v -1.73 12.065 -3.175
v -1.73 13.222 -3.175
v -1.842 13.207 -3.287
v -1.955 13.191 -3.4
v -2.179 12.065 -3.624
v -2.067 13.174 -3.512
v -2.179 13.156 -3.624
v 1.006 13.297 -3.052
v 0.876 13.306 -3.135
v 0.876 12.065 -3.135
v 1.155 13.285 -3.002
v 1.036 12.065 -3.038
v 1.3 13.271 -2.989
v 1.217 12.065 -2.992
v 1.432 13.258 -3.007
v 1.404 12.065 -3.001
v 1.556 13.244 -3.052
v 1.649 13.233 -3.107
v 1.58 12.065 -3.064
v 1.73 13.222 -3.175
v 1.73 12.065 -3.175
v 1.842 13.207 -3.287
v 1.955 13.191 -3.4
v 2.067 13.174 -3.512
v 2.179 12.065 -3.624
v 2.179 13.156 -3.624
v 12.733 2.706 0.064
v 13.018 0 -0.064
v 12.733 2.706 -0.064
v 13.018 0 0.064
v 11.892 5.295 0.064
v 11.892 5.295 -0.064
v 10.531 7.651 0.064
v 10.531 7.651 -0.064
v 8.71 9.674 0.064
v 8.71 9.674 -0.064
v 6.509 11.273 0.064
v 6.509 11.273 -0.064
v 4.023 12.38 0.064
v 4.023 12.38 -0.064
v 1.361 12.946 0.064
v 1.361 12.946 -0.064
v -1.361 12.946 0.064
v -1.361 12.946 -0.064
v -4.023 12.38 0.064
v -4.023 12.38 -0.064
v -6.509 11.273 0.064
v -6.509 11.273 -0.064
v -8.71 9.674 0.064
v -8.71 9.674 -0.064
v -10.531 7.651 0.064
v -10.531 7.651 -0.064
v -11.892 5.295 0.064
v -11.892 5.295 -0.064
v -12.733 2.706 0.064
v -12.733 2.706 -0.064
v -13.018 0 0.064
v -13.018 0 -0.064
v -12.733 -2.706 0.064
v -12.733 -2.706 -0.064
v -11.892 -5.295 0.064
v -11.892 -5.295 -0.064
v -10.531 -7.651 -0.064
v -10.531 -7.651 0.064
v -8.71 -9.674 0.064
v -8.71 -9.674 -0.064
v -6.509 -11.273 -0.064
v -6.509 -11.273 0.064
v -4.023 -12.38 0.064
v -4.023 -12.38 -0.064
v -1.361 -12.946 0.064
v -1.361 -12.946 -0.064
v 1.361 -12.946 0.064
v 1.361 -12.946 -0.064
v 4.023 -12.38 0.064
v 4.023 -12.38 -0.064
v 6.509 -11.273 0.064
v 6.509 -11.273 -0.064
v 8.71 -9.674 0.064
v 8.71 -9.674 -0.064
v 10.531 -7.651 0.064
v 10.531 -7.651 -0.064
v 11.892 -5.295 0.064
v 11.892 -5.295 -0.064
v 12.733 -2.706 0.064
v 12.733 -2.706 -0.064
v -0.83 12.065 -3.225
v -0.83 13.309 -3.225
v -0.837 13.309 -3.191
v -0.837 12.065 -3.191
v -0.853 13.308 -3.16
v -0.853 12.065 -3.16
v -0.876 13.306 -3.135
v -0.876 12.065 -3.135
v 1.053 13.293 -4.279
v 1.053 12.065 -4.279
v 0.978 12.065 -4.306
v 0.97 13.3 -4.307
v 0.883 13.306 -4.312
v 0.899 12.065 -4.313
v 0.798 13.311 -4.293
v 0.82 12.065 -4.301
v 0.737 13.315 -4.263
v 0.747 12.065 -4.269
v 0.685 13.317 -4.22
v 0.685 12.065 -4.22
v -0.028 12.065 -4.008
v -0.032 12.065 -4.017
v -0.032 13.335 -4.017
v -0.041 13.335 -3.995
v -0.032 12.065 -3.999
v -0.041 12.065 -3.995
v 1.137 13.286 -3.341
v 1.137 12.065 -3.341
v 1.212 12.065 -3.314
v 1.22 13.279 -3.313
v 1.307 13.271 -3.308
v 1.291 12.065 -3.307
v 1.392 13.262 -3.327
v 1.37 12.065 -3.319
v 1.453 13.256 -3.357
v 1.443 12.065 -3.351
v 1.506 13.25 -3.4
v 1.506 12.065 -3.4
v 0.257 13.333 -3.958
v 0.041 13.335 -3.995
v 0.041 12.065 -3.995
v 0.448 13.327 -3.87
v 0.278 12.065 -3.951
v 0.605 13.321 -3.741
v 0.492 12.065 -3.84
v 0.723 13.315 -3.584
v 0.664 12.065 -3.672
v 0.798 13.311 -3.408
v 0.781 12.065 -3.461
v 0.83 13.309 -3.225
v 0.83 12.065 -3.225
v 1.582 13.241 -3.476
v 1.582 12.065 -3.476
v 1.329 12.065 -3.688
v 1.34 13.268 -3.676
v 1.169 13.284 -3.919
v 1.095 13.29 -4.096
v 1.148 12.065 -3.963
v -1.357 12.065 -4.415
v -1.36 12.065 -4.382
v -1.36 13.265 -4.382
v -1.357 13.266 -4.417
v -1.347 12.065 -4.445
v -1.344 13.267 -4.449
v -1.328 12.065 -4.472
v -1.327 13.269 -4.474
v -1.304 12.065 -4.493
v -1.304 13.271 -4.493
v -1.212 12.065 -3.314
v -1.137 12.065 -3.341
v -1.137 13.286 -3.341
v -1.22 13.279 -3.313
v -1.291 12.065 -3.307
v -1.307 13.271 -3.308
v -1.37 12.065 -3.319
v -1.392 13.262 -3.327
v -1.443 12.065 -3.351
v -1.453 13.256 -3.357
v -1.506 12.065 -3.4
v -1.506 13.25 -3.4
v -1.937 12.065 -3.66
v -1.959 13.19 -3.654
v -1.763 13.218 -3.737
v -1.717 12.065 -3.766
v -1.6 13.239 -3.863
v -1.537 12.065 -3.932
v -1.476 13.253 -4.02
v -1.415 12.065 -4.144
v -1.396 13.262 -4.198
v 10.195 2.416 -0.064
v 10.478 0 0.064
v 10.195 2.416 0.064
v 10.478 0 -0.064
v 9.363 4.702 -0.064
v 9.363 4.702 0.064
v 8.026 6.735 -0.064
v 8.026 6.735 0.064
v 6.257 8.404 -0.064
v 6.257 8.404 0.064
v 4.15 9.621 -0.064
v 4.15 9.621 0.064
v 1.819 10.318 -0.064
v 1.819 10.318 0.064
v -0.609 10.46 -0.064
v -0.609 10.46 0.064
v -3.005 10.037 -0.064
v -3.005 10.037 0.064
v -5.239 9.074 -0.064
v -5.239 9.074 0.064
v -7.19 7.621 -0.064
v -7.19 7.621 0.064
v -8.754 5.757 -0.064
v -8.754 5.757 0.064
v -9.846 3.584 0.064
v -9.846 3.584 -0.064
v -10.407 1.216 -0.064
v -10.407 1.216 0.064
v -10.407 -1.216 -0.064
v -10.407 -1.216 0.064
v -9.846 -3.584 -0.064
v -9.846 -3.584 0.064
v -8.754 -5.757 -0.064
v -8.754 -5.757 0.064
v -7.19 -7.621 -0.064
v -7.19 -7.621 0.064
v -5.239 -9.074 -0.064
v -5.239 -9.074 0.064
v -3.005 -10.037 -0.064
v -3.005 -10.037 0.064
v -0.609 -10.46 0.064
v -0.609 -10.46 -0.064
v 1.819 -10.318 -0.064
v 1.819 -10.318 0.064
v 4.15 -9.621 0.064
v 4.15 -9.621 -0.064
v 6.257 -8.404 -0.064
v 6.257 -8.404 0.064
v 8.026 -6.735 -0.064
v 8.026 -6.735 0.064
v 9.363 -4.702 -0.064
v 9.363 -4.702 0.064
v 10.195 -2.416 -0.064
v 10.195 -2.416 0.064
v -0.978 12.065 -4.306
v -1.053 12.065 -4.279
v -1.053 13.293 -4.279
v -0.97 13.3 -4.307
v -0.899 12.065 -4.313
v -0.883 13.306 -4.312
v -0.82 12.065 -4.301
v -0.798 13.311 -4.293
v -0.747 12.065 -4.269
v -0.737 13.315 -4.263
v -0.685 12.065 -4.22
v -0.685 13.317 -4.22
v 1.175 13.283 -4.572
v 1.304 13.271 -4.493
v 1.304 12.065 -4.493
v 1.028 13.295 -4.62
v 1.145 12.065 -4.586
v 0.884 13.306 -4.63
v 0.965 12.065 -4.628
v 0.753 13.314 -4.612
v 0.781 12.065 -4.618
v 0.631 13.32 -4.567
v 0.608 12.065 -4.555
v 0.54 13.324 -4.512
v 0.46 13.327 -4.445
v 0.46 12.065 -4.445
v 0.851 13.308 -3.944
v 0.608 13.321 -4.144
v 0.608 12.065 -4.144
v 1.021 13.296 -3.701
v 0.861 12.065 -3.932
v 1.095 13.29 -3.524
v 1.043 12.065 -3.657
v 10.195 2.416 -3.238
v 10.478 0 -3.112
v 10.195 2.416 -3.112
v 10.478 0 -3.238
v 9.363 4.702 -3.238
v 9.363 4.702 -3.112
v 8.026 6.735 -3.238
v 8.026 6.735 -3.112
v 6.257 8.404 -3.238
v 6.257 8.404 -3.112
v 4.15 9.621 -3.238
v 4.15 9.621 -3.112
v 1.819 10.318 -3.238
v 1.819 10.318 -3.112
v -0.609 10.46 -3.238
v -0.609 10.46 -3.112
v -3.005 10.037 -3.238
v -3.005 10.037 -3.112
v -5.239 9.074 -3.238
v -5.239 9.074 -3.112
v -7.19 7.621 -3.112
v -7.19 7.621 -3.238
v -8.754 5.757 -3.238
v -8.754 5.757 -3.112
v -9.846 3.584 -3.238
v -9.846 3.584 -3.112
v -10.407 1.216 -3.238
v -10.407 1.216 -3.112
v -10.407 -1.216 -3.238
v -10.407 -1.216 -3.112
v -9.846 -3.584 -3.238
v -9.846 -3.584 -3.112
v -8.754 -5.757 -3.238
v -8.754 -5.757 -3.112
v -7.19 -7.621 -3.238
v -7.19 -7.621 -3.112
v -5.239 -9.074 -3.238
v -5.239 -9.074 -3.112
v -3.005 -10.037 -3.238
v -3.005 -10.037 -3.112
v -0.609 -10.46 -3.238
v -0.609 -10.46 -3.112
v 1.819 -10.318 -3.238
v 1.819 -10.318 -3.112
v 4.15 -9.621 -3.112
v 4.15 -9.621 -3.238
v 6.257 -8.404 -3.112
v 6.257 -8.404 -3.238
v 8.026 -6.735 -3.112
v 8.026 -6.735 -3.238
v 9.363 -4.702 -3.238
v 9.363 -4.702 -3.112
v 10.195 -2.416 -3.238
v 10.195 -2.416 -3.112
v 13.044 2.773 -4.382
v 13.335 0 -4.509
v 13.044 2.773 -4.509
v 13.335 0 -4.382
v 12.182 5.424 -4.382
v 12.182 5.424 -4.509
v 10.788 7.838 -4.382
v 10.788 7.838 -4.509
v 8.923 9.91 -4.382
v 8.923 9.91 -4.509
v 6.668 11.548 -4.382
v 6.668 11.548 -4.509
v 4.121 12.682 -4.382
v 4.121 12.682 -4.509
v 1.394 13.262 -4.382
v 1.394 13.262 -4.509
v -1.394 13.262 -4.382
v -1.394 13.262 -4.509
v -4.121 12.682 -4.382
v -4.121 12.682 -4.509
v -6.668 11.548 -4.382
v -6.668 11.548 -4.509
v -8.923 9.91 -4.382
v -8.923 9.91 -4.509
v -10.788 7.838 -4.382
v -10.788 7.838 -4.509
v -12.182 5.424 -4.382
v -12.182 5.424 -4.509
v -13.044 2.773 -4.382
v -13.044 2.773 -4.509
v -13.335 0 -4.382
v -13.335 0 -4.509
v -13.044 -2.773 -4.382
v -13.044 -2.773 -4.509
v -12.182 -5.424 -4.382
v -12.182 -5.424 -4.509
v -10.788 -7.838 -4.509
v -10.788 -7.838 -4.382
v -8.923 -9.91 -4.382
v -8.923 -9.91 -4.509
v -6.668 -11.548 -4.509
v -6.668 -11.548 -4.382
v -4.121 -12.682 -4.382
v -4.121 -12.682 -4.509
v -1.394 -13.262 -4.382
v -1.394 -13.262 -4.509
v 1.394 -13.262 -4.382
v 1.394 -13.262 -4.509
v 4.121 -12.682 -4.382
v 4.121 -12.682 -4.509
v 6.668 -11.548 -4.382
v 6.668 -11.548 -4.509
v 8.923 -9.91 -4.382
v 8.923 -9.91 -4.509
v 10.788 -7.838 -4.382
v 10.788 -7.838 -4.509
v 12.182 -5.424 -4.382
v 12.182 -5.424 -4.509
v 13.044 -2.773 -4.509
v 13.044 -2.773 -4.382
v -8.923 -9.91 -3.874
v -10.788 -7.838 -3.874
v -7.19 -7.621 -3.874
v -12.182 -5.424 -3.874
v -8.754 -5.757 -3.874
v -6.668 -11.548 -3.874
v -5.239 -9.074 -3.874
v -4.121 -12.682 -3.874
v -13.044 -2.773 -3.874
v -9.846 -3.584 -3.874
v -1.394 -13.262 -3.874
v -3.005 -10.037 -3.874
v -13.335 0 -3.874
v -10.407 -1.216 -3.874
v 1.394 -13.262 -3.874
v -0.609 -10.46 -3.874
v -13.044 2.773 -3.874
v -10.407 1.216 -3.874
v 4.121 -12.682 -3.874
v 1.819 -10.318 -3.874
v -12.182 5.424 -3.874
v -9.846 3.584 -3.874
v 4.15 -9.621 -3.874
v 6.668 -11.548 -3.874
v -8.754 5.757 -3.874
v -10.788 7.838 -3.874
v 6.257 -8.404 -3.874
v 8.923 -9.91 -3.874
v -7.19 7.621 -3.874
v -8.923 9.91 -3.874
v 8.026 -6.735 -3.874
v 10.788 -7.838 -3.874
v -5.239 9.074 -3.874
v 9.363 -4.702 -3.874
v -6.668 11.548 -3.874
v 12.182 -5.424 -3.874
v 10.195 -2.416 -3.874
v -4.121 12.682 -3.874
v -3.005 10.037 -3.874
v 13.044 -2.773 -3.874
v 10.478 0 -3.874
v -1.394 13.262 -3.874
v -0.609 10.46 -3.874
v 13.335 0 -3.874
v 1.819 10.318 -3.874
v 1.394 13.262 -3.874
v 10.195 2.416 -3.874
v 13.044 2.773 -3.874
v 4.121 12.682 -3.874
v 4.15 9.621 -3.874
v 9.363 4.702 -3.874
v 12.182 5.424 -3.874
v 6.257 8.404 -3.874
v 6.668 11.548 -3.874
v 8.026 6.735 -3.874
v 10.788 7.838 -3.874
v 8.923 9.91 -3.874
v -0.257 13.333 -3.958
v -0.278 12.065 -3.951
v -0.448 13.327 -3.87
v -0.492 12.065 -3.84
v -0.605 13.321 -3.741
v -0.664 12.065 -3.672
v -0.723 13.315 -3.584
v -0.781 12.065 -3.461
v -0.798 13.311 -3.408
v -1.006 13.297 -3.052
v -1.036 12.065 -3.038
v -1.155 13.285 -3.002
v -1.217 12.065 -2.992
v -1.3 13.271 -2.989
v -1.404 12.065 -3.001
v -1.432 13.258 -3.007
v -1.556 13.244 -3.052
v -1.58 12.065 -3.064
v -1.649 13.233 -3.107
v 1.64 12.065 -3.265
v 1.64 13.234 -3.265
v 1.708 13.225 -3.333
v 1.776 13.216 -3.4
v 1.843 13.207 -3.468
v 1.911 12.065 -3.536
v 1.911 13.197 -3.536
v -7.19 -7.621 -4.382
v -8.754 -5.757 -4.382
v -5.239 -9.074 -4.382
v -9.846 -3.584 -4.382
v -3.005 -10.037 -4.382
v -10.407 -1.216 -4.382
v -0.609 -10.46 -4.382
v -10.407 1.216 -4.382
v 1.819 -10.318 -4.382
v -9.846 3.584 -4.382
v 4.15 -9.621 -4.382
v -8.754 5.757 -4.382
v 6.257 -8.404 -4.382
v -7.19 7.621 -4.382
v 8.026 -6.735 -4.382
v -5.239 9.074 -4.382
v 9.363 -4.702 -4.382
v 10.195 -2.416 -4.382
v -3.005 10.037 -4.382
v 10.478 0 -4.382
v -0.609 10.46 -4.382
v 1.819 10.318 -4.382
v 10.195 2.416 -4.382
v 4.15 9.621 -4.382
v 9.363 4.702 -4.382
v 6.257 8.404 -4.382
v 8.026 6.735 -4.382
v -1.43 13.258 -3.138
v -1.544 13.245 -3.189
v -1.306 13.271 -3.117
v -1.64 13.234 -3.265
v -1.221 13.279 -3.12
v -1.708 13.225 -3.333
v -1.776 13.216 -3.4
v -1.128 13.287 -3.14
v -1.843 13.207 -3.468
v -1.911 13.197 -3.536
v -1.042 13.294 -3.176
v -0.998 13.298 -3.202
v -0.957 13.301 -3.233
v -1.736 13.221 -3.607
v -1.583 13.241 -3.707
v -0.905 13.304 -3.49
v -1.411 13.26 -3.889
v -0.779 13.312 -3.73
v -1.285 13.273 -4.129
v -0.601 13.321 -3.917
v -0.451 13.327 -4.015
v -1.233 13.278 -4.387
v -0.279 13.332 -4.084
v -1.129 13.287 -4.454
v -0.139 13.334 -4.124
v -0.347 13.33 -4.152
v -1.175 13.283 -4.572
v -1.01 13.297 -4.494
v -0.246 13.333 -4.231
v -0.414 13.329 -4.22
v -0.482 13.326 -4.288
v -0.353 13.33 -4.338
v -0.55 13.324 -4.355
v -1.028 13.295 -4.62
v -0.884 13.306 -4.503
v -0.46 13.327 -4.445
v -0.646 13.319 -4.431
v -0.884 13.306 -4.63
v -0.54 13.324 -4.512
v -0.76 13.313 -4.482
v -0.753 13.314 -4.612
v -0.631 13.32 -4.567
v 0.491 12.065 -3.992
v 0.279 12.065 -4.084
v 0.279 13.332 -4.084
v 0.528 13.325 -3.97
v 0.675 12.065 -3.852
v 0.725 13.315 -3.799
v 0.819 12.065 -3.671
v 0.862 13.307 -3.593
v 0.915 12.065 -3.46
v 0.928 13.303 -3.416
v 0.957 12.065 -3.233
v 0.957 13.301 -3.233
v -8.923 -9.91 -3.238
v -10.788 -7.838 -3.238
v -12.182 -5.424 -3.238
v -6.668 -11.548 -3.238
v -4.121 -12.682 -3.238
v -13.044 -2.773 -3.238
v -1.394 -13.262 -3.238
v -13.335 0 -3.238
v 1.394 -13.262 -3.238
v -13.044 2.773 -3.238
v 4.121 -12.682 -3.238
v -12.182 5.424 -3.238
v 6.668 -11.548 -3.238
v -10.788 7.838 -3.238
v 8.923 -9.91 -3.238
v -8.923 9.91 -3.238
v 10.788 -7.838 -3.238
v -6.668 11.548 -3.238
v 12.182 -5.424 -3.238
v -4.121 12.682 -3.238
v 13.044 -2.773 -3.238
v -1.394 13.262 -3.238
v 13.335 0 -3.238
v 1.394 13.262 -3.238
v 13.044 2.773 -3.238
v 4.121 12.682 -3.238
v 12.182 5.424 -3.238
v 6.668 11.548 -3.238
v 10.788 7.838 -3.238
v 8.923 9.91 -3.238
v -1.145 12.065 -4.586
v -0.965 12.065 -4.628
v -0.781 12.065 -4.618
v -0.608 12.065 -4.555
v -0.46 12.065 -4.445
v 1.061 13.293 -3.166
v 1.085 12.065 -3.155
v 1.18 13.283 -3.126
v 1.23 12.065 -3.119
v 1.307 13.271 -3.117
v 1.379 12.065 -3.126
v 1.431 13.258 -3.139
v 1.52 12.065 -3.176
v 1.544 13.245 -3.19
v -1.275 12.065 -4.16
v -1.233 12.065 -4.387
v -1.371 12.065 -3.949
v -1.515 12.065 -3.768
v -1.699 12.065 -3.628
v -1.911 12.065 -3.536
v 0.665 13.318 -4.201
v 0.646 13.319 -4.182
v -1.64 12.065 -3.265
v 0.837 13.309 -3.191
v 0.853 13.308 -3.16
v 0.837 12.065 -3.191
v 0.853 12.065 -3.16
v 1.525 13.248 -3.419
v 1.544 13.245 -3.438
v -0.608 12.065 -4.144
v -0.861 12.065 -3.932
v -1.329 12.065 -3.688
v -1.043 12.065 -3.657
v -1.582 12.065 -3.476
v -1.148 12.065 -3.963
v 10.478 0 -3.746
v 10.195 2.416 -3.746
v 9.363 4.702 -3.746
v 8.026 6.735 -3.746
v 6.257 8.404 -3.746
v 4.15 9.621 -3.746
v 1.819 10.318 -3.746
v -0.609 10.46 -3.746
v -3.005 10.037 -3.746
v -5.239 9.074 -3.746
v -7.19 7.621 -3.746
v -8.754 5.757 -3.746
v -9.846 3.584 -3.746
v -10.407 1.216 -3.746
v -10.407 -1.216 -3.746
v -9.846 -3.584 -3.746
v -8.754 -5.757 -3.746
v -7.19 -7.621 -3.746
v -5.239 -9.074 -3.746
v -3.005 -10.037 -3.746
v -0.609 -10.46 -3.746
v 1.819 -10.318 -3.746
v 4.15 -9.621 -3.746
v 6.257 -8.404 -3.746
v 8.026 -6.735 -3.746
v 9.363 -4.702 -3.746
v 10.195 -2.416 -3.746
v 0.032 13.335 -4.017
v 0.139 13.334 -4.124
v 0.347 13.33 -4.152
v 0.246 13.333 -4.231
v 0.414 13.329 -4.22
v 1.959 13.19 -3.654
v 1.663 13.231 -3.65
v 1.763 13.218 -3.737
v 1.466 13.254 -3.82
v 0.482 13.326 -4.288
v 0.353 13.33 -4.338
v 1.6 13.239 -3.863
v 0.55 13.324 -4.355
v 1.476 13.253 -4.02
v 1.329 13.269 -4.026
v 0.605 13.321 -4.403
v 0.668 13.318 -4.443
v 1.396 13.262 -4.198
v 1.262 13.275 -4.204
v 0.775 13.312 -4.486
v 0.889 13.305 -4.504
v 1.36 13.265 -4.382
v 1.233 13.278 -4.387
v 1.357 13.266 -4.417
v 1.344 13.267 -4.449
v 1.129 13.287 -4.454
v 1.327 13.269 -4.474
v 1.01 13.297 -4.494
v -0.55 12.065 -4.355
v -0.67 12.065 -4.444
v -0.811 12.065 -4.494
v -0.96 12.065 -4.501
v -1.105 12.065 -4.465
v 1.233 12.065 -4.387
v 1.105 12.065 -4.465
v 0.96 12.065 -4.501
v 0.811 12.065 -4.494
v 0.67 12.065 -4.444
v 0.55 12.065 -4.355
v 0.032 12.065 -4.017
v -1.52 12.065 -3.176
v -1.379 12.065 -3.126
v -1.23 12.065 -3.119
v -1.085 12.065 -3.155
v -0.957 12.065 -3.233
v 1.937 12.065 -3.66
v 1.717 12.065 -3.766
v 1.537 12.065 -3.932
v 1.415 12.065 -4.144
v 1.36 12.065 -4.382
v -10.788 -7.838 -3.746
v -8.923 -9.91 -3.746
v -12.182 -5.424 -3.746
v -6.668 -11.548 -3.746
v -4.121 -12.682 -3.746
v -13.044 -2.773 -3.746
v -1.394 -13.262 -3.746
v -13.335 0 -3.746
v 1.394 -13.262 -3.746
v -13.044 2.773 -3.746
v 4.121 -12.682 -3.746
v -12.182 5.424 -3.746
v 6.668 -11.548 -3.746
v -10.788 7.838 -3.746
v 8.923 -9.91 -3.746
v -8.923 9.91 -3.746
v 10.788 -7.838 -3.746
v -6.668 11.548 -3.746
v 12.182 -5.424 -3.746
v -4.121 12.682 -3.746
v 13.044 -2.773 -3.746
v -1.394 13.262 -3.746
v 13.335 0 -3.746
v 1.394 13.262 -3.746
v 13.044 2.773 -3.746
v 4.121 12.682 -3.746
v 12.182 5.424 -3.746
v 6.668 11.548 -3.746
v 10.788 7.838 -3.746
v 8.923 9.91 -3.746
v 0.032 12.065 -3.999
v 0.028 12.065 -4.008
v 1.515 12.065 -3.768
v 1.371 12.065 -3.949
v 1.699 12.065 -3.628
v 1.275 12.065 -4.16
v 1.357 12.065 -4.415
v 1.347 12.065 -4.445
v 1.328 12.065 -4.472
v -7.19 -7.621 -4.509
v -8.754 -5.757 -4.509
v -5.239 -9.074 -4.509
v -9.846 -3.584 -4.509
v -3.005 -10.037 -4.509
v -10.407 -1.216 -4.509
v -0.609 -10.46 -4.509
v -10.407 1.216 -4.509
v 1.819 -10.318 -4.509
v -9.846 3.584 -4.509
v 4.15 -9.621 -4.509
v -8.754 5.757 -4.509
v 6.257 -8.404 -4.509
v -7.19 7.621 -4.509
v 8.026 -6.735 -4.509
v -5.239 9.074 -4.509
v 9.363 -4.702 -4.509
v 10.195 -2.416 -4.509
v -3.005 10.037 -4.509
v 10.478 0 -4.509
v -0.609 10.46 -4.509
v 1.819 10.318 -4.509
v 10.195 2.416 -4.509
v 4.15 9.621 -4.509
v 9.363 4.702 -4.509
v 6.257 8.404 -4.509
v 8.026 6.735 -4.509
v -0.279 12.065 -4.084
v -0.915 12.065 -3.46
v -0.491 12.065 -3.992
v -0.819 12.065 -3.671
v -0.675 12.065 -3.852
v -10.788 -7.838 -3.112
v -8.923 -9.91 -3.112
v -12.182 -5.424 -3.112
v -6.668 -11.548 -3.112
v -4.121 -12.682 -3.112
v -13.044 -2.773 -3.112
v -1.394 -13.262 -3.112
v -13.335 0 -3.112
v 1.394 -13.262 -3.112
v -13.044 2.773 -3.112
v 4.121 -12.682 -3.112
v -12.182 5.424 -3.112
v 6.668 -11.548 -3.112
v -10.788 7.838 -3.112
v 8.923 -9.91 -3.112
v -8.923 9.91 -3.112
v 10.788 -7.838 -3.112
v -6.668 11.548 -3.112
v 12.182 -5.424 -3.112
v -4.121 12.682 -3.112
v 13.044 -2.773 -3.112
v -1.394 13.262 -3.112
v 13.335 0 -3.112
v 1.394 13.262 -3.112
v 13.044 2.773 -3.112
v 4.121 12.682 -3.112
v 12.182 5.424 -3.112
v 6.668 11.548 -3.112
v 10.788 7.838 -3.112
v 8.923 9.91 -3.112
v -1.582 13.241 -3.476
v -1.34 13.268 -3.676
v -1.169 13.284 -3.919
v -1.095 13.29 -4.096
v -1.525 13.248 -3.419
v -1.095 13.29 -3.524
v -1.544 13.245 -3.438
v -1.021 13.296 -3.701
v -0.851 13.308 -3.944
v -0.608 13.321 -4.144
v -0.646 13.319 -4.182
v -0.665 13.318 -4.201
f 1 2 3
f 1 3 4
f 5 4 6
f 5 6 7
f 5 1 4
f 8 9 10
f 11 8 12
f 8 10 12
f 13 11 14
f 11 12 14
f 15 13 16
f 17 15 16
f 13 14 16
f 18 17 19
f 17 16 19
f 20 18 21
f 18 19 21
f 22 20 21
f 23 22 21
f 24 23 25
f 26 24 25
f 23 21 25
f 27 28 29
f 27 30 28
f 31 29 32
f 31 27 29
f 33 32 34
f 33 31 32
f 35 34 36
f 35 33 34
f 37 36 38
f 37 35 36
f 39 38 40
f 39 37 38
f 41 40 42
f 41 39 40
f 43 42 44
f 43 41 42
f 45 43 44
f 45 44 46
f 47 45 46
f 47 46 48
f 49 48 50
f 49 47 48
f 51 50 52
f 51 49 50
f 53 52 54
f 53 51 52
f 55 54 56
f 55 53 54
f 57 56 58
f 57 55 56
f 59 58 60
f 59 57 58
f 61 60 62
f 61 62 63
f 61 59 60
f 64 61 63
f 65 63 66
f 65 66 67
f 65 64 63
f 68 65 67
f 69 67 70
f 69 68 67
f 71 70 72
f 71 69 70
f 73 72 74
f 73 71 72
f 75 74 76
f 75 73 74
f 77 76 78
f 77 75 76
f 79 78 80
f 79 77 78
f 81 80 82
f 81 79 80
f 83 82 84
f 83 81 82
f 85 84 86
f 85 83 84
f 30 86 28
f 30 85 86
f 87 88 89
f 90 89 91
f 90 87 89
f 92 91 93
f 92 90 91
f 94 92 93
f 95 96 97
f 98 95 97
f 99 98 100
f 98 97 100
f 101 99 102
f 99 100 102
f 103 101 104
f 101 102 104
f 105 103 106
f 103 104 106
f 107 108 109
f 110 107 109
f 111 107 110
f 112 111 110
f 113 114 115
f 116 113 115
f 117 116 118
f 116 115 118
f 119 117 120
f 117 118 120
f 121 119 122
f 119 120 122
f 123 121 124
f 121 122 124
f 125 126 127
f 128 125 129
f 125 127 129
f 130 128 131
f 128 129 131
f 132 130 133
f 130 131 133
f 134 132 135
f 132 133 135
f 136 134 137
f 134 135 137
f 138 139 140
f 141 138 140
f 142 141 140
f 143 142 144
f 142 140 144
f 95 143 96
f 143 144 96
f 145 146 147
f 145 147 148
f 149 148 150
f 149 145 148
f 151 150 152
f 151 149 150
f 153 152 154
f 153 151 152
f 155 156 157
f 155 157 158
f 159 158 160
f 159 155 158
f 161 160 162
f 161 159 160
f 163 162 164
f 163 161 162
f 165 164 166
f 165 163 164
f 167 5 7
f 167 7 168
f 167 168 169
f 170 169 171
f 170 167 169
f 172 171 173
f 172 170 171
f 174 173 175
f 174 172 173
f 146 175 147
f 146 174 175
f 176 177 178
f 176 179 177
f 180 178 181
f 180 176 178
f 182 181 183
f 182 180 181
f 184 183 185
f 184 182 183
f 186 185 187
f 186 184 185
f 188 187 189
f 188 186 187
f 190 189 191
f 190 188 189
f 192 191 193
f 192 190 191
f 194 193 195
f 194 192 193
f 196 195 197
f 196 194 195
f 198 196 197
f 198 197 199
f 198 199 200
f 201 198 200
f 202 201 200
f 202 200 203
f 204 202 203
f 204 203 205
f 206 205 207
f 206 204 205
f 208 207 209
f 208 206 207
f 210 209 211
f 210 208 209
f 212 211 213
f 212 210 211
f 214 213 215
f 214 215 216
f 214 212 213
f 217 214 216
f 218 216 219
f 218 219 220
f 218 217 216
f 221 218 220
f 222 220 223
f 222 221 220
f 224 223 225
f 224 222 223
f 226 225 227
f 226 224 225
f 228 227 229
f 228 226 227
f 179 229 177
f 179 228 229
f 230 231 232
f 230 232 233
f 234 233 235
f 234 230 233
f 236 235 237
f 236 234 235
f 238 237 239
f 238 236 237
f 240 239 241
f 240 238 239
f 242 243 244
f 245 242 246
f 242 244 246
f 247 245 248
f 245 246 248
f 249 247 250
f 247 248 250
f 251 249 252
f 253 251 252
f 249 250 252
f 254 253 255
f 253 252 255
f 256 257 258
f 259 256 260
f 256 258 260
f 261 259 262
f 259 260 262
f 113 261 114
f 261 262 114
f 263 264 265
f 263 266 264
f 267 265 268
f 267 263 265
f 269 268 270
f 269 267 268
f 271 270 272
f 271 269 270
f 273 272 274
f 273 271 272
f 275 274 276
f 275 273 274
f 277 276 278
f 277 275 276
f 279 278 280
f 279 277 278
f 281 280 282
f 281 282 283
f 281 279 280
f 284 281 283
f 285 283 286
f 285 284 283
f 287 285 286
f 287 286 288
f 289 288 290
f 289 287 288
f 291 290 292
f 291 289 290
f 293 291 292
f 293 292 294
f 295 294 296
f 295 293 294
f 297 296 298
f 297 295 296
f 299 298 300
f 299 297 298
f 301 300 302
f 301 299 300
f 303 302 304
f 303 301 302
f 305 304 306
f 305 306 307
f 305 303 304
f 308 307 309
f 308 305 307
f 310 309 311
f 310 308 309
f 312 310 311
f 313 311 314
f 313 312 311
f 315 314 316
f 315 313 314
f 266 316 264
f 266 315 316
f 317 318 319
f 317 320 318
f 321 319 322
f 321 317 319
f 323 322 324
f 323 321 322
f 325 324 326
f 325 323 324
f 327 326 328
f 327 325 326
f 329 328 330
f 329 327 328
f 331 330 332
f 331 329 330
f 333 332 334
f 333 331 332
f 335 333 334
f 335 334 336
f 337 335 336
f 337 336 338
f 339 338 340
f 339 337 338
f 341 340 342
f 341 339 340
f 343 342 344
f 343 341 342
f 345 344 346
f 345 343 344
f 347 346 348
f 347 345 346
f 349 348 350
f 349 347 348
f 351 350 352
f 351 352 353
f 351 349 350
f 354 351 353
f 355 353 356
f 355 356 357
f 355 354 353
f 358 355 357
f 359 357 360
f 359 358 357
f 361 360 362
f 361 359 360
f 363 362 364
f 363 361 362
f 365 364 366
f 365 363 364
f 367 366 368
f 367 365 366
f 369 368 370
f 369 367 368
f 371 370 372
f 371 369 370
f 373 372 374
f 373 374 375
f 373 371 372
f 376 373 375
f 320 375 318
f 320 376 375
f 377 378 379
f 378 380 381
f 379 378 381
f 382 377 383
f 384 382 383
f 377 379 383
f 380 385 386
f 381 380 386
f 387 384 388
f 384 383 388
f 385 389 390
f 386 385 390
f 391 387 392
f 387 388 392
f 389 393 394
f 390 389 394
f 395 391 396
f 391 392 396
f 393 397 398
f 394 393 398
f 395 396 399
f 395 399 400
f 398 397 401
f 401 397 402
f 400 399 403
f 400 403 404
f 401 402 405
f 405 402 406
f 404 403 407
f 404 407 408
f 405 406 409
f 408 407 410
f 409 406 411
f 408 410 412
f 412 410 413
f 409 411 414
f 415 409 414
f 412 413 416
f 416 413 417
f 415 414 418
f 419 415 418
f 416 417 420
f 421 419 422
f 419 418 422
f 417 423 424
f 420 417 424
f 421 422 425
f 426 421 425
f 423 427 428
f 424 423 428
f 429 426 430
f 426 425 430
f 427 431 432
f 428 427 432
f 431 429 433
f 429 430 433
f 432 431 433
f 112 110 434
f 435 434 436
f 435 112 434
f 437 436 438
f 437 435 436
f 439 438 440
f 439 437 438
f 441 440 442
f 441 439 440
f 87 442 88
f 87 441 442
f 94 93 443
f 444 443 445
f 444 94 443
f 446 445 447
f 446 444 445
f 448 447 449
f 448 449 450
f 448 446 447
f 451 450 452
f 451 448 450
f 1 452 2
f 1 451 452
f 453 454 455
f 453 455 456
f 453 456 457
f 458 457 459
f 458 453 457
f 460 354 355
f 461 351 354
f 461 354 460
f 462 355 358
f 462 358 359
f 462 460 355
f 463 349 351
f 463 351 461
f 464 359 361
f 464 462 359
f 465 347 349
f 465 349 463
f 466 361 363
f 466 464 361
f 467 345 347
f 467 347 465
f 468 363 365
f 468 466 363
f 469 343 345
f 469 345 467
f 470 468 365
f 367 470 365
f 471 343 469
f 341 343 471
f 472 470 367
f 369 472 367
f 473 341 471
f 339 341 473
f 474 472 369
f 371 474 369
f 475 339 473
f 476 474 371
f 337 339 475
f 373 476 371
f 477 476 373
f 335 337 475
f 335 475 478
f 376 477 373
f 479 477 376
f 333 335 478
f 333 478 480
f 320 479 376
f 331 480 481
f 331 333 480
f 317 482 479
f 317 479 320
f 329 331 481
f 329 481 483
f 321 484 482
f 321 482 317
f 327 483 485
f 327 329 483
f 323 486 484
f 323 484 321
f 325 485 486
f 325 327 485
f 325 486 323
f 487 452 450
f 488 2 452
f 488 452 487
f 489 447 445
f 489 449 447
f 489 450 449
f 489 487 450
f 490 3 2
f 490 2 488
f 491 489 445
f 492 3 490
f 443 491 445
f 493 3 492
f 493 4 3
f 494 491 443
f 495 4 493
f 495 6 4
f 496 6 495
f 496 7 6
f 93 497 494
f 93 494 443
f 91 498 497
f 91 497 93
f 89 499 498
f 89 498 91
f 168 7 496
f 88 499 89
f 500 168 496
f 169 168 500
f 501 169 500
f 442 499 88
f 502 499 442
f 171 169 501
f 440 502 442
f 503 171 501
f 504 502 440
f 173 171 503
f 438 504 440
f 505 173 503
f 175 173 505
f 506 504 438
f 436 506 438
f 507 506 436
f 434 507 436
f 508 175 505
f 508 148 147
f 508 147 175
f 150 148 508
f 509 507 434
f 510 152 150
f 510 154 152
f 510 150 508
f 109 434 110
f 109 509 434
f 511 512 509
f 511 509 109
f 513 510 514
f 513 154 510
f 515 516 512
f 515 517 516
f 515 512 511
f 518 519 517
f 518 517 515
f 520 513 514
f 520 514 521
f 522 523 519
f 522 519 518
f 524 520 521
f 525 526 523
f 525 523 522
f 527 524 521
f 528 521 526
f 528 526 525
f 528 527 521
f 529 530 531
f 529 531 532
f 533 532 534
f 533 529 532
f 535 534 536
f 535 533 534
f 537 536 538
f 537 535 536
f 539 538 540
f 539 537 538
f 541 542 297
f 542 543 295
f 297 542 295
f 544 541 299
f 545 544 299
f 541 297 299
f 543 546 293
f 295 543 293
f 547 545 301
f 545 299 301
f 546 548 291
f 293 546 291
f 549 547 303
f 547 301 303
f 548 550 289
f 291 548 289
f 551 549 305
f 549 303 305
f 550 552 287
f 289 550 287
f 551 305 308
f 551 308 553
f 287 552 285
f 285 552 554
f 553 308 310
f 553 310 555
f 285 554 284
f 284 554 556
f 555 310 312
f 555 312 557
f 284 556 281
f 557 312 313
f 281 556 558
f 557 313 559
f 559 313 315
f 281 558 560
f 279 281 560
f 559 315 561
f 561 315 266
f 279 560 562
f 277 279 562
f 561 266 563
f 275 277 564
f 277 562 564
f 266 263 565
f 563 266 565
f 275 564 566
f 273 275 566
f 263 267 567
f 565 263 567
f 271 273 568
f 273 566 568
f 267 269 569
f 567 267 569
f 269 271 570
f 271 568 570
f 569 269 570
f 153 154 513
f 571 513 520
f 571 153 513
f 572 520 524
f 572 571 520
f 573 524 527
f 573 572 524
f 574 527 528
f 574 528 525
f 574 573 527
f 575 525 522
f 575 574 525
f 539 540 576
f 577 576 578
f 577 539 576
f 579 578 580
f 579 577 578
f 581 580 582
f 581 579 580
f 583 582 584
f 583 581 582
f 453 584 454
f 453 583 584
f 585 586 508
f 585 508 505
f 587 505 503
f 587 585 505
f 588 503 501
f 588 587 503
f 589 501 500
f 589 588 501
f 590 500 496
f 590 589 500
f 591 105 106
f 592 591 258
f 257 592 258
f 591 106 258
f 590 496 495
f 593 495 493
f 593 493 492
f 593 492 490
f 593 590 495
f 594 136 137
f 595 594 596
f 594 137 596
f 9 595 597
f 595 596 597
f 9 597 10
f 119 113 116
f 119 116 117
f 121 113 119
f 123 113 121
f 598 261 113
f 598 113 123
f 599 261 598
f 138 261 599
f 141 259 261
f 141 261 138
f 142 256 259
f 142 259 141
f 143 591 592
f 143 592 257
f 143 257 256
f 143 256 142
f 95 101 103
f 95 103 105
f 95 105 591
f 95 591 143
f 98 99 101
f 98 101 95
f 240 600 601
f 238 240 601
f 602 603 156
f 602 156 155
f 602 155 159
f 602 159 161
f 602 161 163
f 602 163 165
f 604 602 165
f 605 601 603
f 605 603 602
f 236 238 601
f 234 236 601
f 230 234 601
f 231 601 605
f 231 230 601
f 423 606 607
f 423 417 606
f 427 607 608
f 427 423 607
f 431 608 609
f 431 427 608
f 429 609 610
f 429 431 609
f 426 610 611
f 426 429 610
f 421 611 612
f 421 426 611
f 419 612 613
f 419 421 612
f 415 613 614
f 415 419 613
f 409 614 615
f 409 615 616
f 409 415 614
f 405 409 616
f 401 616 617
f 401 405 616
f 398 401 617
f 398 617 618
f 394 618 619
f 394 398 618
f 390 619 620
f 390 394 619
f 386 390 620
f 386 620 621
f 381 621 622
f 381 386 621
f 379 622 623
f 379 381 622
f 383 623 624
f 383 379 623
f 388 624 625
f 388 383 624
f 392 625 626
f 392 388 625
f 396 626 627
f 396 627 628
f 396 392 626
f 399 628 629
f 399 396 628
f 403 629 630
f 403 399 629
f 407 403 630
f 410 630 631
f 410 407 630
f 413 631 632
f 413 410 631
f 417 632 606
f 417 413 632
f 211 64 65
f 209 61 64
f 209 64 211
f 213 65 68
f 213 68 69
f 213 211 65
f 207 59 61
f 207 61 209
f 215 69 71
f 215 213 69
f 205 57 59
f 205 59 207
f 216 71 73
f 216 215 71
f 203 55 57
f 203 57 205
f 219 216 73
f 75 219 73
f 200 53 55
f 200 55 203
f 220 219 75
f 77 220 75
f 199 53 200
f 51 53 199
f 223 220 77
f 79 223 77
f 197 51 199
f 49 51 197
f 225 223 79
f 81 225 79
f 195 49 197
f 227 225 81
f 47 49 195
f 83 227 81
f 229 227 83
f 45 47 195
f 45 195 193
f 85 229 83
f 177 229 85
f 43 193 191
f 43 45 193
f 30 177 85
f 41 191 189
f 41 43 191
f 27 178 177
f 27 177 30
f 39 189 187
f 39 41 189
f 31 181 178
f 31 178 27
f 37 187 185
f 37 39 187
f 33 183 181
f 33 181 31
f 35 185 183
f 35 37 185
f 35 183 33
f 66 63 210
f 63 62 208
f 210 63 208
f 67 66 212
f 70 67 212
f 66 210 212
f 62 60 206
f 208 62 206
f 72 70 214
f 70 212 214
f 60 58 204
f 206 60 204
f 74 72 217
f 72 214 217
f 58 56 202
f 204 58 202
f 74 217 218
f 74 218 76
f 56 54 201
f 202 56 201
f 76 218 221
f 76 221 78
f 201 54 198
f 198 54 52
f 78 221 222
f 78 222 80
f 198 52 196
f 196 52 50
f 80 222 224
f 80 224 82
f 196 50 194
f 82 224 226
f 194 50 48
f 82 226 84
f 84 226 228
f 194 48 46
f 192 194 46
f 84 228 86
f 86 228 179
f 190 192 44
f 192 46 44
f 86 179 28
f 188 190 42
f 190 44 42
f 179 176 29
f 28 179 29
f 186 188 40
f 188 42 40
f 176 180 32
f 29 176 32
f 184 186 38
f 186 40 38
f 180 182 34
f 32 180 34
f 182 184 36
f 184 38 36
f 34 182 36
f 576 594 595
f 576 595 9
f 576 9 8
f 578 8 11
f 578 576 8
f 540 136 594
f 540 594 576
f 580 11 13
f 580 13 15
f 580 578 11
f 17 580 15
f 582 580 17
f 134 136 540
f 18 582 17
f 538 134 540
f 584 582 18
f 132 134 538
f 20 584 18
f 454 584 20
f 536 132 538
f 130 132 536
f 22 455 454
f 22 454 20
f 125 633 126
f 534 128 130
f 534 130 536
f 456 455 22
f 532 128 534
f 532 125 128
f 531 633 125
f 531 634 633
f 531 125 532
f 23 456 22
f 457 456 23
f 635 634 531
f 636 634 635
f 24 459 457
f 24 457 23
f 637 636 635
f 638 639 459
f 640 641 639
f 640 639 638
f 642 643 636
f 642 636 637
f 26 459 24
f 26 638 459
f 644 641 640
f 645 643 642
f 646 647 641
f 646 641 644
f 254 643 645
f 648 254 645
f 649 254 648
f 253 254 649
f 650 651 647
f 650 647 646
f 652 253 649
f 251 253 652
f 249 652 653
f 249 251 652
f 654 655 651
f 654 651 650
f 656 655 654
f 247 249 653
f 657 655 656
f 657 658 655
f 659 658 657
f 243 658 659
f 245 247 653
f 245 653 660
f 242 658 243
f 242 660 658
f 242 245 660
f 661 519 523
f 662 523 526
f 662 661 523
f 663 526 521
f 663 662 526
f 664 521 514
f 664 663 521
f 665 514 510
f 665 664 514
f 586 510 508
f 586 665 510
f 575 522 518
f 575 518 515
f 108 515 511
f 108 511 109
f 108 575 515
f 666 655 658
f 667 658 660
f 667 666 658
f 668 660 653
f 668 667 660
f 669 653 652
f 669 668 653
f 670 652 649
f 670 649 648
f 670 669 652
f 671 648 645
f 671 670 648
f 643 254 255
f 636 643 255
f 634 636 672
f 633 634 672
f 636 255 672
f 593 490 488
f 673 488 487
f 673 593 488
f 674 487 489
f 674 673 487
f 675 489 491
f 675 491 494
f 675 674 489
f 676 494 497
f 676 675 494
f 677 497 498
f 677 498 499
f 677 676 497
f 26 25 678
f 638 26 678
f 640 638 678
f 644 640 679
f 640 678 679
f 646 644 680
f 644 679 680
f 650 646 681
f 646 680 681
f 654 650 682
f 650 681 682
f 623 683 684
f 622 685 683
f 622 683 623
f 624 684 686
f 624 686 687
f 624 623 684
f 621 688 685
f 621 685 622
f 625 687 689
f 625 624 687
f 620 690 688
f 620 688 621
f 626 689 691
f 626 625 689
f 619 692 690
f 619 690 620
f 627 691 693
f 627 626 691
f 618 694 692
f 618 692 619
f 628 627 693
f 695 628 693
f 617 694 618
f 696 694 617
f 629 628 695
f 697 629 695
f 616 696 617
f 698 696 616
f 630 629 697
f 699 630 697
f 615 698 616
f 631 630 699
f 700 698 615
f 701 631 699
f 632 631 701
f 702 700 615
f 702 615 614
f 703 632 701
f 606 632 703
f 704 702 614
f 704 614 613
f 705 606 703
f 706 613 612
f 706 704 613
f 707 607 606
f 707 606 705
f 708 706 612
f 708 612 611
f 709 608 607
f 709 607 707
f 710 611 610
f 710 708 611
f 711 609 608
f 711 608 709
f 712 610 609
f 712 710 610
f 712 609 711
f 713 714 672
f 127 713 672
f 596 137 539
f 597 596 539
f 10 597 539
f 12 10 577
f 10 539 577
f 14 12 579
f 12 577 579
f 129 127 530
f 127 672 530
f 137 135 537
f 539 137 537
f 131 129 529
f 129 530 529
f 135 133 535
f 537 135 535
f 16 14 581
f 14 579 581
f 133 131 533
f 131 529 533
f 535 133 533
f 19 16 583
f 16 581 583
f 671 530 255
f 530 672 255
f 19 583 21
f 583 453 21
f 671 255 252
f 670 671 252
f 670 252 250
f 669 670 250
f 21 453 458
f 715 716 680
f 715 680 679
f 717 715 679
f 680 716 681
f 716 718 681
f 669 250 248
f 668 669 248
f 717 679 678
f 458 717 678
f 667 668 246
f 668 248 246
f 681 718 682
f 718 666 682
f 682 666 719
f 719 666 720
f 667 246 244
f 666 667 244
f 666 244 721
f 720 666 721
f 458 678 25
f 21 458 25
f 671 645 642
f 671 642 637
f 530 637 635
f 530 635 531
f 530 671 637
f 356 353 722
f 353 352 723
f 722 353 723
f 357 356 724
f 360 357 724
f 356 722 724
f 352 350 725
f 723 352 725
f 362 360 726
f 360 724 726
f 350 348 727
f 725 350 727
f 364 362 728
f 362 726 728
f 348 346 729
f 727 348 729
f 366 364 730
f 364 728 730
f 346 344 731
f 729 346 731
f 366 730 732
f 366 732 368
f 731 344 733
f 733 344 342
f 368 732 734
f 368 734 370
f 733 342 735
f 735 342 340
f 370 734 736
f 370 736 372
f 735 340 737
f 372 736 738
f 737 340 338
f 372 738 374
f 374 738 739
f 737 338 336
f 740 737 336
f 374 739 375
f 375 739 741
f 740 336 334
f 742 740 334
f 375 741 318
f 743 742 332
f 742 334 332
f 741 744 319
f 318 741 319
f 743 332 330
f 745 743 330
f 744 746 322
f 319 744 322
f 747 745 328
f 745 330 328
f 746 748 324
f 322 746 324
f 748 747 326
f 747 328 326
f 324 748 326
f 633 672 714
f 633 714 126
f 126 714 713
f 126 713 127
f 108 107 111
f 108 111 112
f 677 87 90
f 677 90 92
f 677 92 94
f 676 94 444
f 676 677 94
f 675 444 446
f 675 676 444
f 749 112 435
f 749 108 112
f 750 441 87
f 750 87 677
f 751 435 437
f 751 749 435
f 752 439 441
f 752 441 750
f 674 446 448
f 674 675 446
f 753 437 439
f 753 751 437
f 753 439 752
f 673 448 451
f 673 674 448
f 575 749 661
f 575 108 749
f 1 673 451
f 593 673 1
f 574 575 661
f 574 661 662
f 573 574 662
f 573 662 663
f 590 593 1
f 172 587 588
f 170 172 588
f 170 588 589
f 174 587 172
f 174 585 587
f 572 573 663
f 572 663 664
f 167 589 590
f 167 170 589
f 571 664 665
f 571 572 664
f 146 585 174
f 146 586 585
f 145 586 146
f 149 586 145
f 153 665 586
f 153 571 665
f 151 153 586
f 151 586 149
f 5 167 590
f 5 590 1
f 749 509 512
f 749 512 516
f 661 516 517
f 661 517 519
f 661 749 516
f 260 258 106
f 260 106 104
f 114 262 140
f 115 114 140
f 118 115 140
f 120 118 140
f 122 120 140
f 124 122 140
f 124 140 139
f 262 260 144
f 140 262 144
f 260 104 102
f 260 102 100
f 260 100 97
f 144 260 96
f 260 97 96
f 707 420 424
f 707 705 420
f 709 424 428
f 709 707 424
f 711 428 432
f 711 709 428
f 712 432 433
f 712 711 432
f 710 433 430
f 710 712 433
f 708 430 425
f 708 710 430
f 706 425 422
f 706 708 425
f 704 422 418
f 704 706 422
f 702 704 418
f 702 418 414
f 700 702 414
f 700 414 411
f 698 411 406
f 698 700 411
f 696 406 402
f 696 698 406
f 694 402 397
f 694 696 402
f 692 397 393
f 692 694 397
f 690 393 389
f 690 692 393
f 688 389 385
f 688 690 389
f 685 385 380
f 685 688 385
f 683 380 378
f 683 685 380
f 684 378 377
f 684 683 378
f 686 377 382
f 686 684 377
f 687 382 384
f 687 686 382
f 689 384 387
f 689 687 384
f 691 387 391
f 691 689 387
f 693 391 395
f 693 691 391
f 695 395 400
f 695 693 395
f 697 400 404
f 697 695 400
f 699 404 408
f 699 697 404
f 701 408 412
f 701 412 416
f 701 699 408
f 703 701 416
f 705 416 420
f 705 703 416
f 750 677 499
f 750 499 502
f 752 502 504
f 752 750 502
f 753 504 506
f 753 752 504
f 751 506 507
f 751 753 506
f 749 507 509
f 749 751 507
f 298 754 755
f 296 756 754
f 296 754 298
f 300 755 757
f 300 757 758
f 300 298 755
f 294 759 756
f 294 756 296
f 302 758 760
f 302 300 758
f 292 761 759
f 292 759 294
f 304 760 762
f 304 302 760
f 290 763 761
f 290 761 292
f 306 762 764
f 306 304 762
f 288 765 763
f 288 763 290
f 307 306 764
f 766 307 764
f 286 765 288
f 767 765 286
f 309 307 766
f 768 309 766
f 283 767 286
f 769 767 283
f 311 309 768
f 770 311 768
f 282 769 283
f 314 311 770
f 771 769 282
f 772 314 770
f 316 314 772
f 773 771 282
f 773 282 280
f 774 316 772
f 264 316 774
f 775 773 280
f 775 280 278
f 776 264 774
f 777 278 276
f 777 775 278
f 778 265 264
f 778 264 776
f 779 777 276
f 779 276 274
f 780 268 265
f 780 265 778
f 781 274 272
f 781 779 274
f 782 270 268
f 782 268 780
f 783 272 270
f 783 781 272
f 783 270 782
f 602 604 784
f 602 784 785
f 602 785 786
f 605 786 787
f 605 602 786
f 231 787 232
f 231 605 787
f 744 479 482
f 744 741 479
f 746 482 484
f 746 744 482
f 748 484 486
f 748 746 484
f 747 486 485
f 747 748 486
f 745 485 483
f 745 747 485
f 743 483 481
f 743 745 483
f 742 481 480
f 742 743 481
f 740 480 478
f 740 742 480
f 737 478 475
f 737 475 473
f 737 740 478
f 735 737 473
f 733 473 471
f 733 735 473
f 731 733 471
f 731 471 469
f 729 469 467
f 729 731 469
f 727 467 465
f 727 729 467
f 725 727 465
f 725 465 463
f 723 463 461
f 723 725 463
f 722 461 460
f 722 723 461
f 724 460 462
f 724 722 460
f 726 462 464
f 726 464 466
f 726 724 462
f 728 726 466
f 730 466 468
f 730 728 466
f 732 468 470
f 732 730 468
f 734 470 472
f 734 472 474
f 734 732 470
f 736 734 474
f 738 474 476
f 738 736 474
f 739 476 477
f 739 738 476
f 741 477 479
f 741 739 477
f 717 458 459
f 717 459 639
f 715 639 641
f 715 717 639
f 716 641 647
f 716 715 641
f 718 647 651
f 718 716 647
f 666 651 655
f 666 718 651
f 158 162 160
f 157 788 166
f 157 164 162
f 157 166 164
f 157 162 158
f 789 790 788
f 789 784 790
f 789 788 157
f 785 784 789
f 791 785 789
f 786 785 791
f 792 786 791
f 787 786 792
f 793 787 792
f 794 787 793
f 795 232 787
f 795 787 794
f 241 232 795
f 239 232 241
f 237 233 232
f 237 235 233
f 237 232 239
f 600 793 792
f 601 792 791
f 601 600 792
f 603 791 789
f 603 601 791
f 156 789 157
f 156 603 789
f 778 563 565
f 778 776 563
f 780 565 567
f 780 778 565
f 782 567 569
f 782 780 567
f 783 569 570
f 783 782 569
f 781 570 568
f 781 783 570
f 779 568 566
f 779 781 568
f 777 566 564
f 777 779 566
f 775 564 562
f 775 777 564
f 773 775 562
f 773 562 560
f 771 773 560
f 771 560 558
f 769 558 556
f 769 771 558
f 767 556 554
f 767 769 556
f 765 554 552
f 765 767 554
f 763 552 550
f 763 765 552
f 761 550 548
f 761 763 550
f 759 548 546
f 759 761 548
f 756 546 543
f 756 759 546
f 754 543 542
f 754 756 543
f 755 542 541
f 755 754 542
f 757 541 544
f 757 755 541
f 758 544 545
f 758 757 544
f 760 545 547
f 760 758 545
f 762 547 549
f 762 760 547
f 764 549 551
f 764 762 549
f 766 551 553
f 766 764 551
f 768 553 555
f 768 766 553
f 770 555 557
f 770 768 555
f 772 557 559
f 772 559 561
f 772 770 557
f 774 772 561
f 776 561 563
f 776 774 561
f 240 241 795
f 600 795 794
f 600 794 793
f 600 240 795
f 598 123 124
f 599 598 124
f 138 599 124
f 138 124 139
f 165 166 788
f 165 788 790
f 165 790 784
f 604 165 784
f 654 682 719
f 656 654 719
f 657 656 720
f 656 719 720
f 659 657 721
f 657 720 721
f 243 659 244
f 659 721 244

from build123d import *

# Parameters (mm, degrees)
SKETCH1_R                = 13.0175
SKETCH1_R_2              = 12.3825
SKETCH1_R_3              = 10.4775
BOSS_EXTRUDE1_DEPTH      = 0.0635
BOSS_EXTRUDE3_REACH      = 30.259
BOSS_EXTRUDE3_END_RADIUS = 13.335
SKETCH4_R                = 13.335
SKETCH4_R_2              = 10.4775
BOSS_EXTRUDE4_DEPTH      = 0.0635
SKETCH9_R                = 13.335
SKETCH9_R_2              = 10.4775
BOSS_EXTRUDE5_DEPTH      = 0.0635
SKETCH10_R               = 13.335
SKETCH10_R_2             = 10.4775
BOSS_EXTRUDE6_DEPTH      = 0.0635


with BuildPart() as part:
    # Sketch1 → Boss-Extrude1 (new, symmetric)
    with BuildSketch(Plane.XY):
        Circle(SKETCH1_R)
        Circle(SKETCH1_R_2, mode=Mode.SUBTRACT)
        Circle(SKETCH1_R_2)
        Circle(SKETCH1_R_3, mode=Mode.SUBTRACT)
    extrude(amount=BOSS_EXTRUDE1_DEPTH, both=True)


with BuildPart() as body_2:
    # Boss-Extrude3: up to this cylinder (the profile starts inside it)
    boss_extrude3_end = Plane(origin=(0, 0, -4.0107315), z_dir=(0, 0, -1)) * Cylinder(BOSS_EXTRUDE3_END_RADIUS, 89.372447, mode=Mode.PRIVATE)
    # Sketch3 → Boss-Extrude3 (new, up to the surface)
    with BuildSketch(Plane(origin=(0, 12.065, 0), x_dir=(1, 0, 0), z_dir=(0, 1, 0)), mode=Mode.PRIVATE) as boss_extrude3_sk1:
        with BuildLine():
            Line((0.460039804, 4.445004699), (0.03216311, 4.017128005))
            ThreePointArc((0.03216311, 4.017128005), (0.029324213, 4.003500425), (0.040684587, 3.995456038))
            ThreePointArc((0.040684587, 3.995456038), (0.584364457, 3.762630541), (0.830499923, 3.224845413))
            ThreePointArc((0.830499923, 3.224845413), (0.844051449, 3.175009397), (0.876325349, 3.134689828))
            ThreePointArc((0.876325349, 3.134689828), (1.310980159, 2.989724348), (1.730039804, 3.175004699))
            Line((1.730039804, 3.175004699), (2.178784076, 3.623749188))
            ThreePointArc((2.178784076, 3.623749188), (1.620796803, 3.842668346), (1.360187679, 4.382444484))
            ThreePointArc((1.360187679, 4.382444484), (1.34655763, 4.445), (1.304234905, 4.493039127))
            ThreePointArc((1.304234905, 4.493039127), (0.872979662, 4.629966452), (0.460039804, 4.445004699))
        make_face()
        with BuildLine():
            Line((1.640237243, 3.26480726), (1.9111001, 3.53567023))
            ThreePointArc((1.9111001, 3.53567023), (1.437467163, 3.85446617), (1.232813929, 4.387454034))
            ThreePointArc((1.232813929, 4.387454034), (0.885090081, 4.503426418), (0.549842365, 4.355202137))
            Line((0.549842365, 4.355202137), (0.278976021, 4.084335794))
            ThreePointArc((0.278976021, 4.084335794), (0.752610048, 3.765541996), (0.957265678, 3.232555363))
            ThreePointArc((0.957265678, 3.232555363), (1.304989527, 3.11658298), (1.640237243, 3.26480726))
        make_face(mode=Mode.SUBTRACT)
    boss_extrude3_tool1 = extrude(boss_extrude3_sk1.sketch, amount=BOSS_EXTRUDE3_REACH, mode=Mode.PRIVATE) & boss_extrude3_end
    add(boss_extrude3_tool1.solids().sort_by_distance((0.874517, 12.065, -4.602955))[0])
    # Sketch3 → Boss-Extrude3 (new, up to the surface)
    with BuildSketch(Plane(origin=(0, 12.065, 0), x_dir=(1, 0, 0), z_dir=(0, 1, 0)), mode=Mode.PRIVATE) as boss_extrude3_sk2:
        with BuildLine():
            Line((-1.730039804, 3.175004699), (-2.178784076, 3.623749188))
            ThreePointArc((-2.178784076, 3.623749188), (-1.620796803, 3.842668346), (-1.360187679, 4.382444484))
            ThreePointArc((-1.360187679, 4.382444484), (-1.34655763, 4.445), (-1.304234905, 4.493039127))
            ThreePointArc((-1.304234905, 4.493039127), (-0.872979662, 4.629966452), (-0.460039804, 4.445004699))
            Line((-0.460039804, 4.445004699), (-0.03216311, 4.017128005))
            ThreePointArc((-0.03216311, 4.017128005), (-0.029324213, 4.003500425), (-0.040684587, 3.995456038))
            ThreePointArc((-0.040684587, 3.995456038), (-0.584364457, 3.762630541), (-0.830499923, 3.224845413))
            ThreePointArc((-0.830499923, 3.224845413), (-0.844051449, 3.175009397), (-0.876325349, 3.134689828))
            ThreePointArc((-0.876325349, 3.134689828), (-1.310980159, 2.989724348), (-1.730039804, 3.175004699))
        make_face()
        with BuildLine():
            ThreePointArc((-1.232813929, 4.387454034), (-1.437467163, 3.85446617), (-1.9111001, 3.53567023))
            Line((-1.9111001, 3.53567023), (-1.640237243, 3.26480726))
            ThreePointArc((-1.640237243, 3.26480726), (-1.304989527, 3.11658298), (-0.957265678, 3.232555363))
            ThreePointArc((-0.957265678, 3.232555363), (-0.752610048, 3.765541996), (-0.278976021, 4.084335794))
            Line((-0.278976021, 4.084335794), (-0.549842365, 4.355202137))
            ThreePointArc((-0.549842365, 4.355202137), (-0.885090081, 4.503426418), (-1.232813929, 4.387454034))
        make_face(mode=Mode.SUBTRACT)
    boss_extrude3_tool2 = extrude(boss_extrude3_sk2.sketch, amount=BOSS_EXTRUDE3_REACH, mode=Mode.PRIVATE) & boss_extrude3_end
    add(boss_extrude3_tool2.solids().sort_by_distance((-1.935281, 12.065, -3.418508))[0])
    # Sketch3 → Boss-Extrude3 (new, up to the surface)
    with BuildSketch(Plane(origin=(0, 12.065, 0), x_dir=(1, 0, 0), z_dir=(0, 1, 0)), mode=Mode.PRIVATE) as boss_extrude3_sk3:
        with BuildLine():
            ThreePointArc((-1.052713427, 4.279131116), (-0.859118112, 4.309540606), (-0.684546207, 4.220498296))
            Line((-0.684546207, 4.220498296), (-0.608292834, 4.144244923))
            ThreePointArc((-0.608292834, 4.144244923), (-0.961843799, 3.801183986), (-1.137365744, 3.340878503))
            ThreePointArc((-1.137365744, 3.340878503), (-1.330961254, 3.310468752), (-1.505533401, 3.399511102))
            Line((-1.505533401, 3.399511102), (-1.581784051, 3.475761789))
            ThreePointArc((-1.581784051, 3.475761789), (-1.228233763, 3.818824337), (-1.052713427, 4.279131116))
        make_face()
    boss_extrude3_tool3 = extrude(boss_extrude3_sk3.sketch, amount=BOSS_EXTRUDE3_REACH, mode=Mode.PRIVATE) & boss_extrude3_end
    add(boss_extrude3_tool3.solids().sort_by_distance((-1.095038, 12.065, -3.810005))[0])
    # Sketch3 → Boss-Extrude3 (new, up to the surface)
    with BuildSketch(Plane(origin=(0, 12.065, 0), x_dir=(1, 0, 0), z_dir=(0, 1, 0)), mode=Mode.PRIVATE) as boss_extrude3_sk4:
        with BuildLine():
            ThreePointArc((1.052713427, 4.279131116), (0.859118112, 4.309540606), (0.684546207, 4.220498296))
            Line((0.684546207, 4.220498296), (0.608292834, 4.144244923))
            ThreePointArc((0.608292834, 4.144244923), (0.961843799, 3.801183986), (1.137365744, 3.340878503))
            ThreePointArc((1.137365744, 3.340878503), (1.330961254, 3.310468752), (1.505533401, 3.399511102))
            Line((1.505533401, 3.399511102), (1.581784051, 3.475761789))
            ThreePointArc((1.581784051, 3.475761789), (1.228233763, 3.818824337), (1.052713427, 4.279131116))
        make_face()
    boss_extrude3_tool4 = extrude(boss_extrude3_sk4.sketch, amount=BOSS_EXTRUDE3_REACH, mode=Mode.PRIVATE) & boss_extrude3_end
    add(boss_extrude3_tool4.solids().sort_by_distance((1.095038, 12.065, -3.810005))[0])


with BuildPart() as body_3:
    # Sketch4 → Boss-Extrude4 (new, symmetric)
    with BuildSketch(Plane.XY.offset(-3.175)):
        Circle(SKETCH4_R)
        Circle(SKETCH4_R_2, mode=Mode.SUBTRACT)
    extrude(amount=BOSS_EXTRUDE4_DEPTH, both=True)


with BuildPart() as body_4:
    # Sketch9 → Boss-Extrude5 (new, symmetric)
    with BuildSketch(Plane.XY.offset(-3.81)):
        Circle(SKETCH9_R)
        Circle(SKETCH9_R_2, mode=Mode.SUBTRACT)
    extrude(amount=BOSS_EXTRUDE5_DEPTH, both=True)


with BuildPart() as body_5:
    # Sketch10 → Boss-Extrude6 (new, symmetric)
    with BuildSketch(Plane.XY.offset(-4.445)):
        Circle(SKETCH10_R)
        Circle(SKETCH10_R_2, mode=Mode.SUBTRACT)
    extrude(amount=BOSS_EXTRUDE6_DEPTH, both=True)


solid = Compound([part.part, body_2.part, body_3.part, body_4.part, body_5.part])
